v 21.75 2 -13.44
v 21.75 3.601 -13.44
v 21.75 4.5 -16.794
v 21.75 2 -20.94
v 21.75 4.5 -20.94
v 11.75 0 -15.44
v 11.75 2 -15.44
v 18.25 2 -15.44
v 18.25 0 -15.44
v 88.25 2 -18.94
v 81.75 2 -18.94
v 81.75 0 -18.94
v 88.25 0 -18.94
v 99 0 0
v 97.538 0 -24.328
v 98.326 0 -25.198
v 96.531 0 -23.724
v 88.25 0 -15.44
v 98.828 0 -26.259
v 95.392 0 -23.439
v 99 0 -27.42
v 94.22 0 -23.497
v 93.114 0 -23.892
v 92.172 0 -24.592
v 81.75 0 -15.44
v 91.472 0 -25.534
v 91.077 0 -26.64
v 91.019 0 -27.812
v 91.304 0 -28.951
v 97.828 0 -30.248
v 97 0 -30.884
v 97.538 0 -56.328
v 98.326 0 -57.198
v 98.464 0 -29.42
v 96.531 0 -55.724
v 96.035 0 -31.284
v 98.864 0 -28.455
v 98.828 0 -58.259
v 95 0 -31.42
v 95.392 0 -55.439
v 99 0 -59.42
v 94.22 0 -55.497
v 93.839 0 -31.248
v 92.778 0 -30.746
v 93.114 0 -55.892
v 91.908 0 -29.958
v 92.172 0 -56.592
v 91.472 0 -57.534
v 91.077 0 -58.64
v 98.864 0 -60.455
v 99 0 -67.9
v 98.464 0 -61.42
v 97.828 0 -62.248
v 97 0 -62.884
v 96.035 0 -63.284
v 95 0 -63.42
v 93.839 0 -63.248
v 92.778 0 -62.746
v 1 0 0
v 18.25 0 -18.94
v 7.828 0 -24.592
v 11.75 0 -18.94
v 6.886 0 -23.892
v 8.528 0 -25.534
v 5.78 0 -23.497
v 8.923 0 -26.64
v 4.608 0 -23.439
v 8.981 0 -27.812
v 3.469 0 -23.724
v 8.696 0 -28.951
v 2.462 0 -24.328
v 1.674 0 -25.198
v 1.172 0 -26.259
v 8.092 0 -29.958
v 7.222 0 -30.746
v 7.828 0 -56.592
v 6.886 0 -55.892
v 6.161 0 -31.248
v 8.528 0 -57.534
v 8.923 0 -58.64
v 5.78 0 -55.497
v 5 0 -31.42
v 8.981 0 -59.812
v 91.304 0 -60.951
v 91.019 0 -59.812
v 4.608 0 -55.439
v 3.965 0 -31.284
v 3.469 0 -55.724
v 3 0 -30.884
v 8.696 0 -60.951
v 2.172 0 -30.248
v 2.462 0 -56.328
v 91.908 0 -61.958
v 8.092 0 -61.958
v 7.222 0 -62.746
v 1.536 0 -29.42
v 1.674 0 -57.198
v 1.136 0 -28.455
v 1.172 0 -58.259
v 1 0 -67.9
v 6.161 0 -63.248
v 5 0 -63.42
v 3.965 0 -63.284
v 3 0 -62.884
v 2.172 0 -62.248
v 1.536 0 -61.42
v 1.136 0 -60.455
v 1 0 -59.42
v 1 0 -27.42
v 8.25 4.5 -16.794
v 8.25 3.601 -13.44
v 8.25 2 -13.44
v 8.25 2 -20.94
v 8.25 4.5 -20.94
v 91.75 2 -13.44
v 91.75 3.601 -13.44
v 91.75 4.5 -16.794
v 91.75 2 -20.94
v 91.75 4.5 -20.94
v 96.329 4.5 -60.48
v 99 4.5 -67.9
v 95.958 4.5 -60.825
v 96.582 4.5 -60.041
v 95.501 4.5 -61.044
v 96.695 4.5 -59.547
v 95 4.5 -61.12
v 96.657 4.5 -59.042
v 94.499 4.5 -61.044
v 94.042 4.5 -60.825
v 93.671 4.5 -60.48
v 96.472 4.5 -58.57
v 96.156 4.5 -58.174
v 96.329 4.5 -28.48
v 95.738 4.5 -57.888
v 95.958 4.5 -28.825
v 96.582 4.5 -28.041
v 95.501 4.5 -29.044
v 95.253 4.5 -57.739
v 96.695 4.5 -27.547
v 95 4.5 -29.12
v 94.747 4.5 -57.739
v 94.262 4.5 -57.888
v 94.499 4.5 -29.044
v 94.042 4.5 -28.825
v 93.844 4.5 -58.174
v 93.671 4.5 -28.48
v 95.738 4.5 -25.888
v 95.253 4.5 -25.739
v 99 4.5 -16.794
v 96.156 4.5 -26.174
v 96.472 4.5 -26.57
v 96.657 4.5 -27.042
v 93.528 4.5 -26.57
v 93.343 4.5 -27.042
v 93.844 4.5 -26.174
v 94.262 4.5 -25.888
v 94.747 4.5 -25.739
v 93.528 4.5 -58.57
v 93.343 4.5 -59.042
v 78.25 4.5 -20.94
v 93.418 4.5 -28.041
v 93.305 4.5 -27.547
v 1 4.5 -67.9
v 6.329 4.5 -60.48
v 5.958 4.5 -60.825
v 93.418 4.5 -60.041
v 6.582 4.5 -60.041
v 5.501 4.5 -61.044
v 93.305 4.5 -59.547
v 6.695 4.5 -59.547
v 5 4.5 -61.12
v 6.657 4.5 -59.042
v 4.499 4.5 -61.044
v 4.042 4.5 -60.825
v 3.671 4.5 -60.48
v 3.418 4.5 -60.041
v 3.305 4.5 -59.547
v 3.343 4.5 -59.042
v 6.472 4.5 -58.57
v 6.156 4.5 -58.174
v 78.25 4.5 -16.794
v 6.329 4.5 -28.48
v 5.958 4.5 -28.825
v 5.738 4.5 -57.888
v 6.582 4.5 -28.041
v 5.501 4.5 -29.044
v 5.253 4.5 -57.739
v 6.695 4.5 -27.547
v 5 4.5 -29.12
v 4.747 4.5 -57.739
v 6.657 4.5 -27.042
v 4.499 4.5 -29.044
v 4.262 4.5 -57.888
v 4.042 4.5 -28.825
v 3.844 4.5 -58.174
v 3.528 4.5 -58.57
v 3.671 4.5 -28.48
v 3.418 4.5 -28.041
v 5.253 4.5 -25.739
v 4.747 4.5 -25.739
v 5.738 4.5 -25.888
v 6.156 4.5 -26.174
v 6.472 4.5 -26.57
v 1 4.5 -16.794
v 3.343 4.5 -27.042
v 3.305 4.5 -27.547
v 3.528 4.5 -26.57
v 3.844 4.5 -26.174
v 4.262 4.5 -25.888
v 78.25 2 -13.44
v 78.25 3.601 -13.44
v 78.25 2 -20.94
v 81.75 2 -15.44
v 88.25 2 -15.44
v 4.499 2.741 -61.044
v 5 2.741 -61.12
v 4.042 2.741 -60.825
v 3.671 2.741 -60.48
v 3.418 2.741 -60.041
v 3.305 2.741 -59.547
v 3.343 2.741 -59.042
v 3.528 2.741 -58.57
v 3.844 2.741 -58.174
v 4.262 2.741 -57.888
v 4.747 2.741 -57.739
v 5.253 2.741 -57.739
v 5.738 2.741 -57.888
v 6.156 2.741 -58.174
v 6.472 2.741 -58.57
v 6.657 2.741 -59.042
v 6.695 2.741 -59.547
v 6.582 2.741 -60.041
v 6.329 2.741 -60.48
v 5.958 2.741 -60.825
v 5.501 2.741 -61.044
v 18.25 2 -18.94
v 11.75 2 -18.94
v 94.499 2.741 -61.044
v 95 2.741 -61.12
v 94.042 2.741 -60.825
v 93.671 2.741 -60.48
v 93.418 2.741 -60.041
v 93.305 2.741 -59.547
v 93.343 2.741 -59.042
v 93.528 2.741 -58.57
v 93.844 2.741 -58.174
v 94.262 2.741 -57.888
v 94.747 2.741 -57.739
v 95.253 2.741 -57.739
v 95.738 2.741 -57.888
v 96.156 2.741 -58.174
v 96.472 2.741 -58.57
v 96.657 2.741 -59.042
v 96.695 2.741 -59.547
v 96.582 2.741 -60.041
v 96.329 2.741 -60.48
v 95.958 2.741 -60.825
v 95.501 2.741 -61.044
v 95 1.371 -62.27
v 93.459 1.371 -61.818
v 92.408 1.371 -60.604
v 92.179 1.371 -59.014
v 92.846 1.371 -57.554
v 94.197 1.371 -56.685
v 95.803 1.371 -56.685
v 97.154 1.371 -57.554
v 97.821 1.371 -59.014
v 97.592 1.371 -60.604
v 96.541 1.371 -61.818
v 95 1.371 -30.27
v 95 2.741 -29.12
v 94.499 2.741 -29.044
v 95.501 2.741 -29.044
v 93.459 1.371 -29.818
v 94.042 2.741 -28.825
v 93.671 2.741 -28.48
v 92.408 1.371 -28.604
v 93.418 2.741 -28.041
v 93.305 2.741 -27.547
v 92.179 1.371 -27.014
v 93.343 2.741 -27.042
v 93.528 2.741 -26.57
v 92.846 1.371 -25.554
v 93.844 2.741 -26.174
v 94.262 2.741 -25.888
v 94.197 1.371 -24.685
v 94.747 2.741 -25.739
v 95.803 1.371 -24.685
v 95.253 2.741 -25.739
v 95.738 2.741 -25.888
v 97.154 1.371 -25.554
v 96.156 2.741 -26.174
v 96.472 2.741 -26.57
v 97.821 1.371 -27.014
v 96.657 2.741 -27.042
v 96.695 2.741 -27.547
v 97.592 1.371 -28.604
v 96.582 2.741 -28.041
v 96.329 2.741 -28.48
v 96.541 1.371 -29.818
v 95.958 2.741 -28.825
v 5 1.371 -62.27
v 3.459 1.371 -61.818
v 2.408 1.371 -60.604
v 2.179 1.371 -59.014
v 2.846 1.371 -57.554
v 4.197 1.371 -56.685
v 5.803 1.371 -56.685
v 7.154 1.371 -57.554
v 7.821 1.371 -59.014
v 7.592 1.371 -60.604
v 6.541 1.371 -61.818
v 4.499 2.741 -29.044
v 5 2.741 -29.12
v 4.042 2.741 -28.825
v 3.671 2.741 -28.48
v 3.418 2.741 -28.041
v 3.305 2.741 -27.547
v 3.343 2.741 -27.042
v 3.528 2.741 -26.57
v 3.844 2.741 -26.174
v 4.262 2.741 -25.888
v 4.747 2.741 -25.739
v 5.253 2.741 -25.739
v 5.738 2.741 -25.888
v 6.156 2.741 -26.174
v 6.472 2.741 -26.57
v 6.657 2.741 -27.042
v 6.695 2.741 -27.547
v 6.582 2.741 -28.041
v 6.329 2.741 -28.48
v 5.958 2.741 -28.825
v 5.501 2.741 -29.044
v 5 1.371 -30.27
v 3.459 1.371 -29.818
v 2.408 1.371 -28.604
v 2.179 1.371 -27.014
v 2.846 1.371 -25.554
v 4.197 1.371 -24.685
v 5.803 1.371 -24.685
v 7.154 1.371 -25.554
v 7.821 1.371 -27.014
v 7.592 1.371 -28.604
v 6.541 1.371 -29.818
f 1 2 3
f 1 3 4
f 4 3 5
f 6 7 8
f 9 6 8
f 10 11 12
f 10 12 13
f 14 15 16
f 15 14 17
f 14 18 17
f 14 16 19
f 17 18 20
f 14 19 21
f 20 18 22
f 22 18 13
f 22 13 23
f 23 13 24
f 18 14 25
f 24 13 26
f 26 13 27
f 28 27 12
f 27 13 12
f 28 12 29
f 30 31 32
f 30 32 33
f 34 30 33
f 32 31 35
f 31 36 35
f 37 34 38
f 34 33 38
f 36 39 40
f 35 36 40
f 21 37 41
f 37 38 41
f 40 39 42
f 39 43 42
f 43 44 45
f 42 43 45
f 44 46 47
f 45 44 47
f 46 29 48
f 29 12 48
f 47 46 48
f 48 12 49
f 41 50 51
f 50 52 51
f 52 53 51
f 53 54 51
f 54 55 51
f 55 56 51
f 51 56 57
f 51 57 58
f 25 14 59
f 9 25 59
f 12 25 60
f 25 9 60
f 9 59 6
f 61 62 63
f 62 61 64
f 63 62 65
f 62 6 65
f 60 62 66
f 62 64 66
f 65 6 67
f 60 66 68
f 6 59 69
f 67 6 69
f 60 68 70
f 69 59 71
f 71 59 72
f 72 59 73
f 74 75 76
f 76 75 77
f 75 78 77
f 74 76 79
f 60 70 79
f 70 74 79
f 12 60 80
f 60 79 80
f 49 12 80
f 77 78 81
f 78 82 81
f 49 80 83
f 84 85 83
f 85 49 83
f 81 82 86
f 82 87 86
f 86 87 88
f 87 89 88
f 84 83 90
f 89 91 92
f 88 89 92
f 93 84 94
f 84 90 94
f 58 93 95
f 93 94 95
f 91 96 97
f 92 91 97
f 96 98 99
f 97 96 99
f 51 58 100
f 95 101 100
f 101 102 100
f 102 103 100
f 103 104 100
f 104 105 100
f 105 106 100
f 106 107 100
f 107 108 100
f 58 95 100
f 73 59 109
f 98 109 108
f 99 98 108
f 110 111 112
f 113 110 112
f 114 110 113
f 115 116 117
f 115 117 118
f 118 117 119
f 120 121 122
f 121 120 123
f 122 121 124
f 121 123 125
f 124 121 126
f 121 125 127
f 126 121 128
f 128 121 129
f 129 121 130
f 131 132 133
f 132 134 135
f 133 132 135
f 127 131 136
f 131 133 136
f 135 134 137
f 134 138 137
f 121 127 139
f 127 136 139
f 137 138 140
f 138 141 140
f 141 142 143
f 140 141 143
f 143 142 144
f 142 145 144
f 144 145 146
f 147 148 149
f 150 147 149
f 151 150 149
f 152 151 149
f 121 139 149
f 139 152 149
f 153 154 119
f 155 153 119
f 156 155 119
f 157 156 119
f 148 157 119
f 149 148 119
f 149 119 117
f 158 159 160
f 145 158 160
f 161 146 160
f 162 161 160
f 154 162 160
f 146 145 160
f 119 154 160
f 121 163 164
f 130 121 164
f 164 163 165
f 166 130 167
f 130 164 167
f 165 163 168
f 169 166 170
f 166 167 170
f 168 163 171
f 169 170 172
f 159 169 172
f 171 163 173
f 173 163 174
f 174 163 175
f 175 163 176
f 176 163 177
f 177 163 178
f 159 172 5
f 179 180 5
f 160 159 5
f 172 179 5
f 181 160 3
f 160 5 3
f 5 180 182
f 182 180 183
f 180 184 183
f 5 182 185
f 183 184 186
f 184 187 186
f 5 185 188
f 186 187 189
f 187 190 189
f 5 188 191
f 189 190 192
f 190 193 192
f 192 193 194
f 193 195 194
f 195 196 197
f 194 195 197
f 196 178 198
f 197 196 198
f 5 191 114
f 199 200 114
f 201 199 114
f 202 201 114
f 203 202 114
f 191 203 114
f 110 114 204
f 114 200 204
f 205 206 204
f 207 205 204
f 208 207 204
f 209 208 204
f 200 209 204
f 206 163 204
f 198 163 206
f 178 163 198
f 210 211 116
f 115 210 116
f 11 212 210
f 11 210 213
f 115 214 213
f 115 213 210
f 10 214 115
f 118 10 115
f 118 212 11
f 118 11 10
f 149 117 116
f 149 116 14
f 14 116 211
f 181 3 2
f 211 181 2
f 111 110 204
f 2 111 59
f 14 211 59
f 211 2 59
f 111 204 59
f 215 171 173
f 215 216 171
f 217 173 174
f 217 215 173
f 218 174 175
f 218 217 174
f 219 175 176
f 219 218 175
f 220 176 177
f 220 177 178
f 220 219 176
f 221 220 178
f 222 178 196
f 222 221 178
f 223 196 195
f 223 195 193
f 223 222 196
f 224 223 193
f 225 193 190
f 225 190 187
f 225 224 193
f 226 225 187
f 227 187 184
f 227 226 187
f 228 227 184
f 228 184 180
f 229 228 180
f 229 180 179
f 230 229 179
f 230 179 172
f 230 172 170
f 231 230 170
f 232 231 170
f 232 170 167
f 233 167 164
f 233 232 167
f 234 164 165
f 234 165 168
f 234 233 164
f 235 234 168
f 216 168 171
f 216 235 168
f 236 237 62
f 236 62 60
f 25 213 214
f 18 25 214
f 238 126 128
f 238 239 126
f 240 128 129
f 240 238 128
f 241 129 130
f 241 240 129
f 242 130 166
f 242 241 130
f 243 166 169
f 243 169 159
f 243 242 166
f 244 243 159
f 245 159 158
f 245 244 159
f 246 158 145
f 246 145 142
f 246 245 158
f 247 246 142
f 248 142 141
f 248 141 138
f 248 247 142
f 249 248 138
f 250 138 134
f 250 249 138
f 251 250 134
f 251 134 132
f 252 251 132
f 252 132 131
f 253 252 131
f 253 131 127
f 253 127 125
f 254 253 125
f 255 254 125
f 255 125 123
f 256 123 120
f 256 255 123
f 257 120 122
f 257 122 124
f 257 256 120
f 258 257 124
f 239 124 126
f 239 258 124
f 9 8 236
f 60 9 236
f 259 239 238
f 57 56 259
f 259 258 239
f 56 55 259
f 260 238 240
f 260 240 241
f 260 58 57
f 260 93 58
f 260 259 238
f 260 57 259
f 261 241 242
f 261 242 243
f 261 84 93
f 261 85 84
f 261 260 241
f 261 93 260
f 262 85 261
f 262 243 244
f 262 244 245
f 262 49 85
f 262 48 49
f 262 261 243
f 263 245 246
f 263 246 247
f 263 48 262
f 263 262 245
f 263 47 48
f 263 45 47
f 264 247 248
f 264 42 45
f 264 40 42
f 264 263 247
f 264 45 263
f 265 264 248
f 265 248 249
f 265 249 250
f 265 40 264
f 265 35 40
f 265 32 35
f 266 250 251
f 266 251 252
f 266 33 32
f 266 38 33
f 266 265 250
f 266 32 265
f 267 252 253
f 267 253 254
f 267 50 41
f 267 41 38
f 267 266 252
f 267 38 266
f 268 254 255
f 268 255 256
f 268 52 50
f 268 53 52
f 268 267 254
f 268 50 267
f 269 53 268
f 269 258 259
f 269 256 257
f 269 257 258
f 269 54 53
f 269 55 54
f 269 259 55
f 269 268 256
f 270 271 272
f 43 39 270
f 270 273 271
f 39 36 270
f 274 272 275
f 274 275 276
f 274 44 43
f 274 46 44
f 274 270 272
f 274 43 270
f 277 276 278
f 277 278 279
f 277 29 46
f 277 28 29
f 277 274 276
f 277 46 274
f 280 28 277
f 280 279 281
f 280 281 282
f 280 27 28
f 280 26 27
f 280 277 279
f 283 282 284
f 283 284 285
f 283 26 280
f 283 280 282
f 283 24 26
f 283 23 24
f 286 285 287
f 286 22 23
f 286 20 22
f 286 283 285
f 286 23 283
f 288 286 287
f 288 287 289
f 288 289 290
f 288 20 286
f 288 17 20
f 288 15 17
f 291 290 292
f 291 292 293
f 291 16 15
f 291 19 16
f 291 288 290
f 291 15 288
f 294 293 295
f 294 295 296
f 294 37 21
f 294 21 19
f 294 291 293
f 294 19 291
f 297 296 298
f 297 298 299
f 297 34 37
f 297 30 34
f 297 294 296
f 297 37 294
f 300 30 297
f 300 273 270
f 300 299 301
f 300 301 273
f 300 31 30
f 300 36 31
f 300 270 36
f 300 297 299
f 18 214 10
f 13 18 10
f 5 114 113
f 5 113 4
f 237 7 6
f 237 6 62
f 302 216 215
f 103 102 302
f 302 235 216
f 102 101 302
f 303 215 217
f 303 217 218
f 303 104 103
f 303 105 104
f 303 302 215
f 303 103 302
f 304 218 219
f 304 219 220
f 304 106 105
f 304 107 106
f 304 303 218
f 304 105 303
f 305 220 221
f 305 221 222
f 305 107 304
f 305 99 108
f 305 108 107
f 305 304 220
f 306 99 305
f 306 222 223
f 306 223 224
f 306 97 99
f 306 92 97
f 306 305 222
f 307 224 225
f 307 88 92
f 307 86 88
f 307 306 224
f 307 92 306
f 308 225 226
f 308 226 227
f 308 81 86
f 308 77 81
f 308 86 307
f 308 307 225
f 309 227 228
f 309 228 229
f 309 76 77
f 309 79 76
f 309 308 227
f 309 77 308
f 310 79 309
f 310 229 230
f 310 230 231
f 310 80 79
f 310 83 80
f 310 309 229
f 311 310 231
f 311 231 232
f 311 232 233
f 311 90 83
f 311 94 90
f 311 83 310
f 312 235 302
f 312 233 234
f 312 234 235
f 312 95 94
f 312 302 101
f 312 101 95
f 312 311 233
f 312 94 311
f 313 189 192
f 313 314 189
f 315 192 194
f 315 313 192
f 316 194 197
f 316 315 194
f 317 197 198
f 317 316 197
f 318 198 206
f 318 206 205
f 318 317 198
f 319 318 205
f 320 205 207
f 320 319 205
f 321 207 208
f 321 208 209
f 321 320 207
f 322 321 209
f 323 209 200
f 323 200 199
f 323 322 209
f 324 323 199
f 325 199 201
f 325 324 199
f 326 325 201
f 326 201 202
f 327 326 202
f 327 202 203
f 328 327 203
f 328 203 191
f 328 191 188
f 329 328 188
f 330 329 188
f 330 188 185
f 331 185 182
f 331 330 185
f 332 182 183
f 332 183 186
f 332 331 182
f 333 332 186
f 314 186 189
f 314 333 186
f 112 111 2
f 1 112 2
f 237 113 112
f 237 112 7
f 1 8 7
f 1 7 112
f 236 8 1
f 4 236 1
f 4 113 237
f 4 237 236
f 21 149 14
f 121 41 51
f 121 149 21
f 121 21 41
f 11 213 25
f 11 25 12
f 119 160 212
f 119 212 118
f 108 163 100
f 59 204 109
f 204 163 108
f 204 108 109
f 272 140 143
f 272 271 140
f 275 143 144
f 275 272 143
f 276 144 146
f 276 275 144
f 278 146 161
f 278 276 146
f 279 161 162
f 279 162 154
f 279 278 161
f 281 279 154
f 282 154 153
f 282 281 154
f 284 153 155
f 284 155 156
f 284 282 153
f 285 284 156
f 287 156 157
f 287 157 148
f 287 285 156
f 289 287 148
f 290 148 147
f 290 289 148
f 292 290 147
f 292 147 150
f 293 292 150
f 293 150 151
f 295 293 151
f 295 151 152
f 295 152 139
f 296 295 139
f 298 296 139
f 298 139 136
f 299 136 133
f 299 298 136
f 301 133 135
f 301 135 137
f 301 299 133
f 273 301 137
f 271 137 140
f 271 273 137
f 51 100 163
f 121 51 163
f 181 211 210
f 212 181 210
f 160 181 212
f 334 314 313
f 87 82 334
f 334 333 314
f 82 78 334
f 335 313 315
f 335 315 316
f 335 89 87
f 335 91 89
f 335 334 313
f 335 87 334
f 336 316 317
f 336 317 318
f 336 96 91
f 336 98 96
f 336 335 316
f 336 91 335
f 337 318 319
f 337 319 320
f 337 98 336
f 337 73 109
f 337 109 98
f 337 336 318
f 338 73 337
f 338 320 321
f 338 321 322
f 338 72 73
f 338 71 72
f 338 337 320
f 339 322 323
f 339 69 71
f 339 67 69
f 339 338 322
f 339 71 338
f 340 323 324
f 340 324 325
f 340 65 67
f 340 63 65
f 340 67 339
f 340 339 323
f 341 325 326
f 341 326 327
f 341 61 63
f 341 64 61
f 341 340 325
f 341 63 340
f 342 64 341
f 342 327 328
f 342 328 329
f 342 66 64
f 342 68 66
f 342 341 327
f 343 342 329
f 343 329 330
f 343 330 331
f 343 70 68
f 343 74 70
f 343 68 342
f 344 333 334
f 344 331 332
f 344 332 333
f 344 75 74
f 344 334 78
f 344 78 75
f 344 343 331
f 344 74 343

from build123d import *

# Parameters (mm, degrees)
SALIENTE_EXTRUIR1_DEPTH                        = 100
CSK_FOR_M3_FLAT_HEAD_MACHINE_SCREW1_AT_2_COUNT = 2
CSK_FOR_M3_FLAT_HEAD_MACHINE_SCREW1_AT_2_PITCH = 90
CSK_FOR_M3_FLAT_HEAD_MACHINE_SCREW1_AT_3_COUNT = 2
CSK_FOR_M3_FLAT_HEAD_MACHINE_SCREW1_AT_3_PITCH = 95.51963149
CSK_FOR_M3_FLAT_HEAD_MACHINE_SCREW1_AT_4_COUNT = 2
CSK_FOR_M3_FLAT_HEAD_MACHINE_SCREW1_AT_4_PITCH = 32
CROQUIS4_W                                     = 6.5
CROQUIS4_H                                     = 3.5
CORTAR_EXTRUIR3_DEPTH                          = 121.957265181
CROQUIS8_W                                     = 13.5
CROQUIS8_H                                     = 7.5
CORTAR_EXTRUIR4_DEPTH                          = 2.5
CORTAR_EXTRUIR5_DEPTH                          = 1
CROQUIS12_W                                    = 67.9
CROQUIS12_H                                    = 8.529184672
CORTAR_EXTRUIR6_DEPTH                          = 1


with BuildPart() as part:
    # Croquis1 → Saliente-Extruir1 (new body)
    with BuildSketch(Plane(origin=(0, 0, 0), x_dir=(0, 0, -1), z_dir=(1, 0, 0))):
        Polygon((0, 0), (67.9, 0), (67.9, 4.5), (16.794228634, 4.5), align=None)
    extrude(amount=SALIENTE_EXTRUIR1_DEPTH)

    # Croquis3 → CSK for M3 Flat Head Machine Screw1 (revolve, cut)
    with BuildSketch(Plane(origin=(95, 0, -59.42), x_dir=(0, 0, -1), z_dir=(1, 0, 0))):
        Polygon((0, 0), (0, 4.5), (1.7, 4.5), (1.7, 2.741033263), (4, 0), align=None)
    csk_for_m3_flat_head_machine_screw1 = revolve(axis=Axis((95, -6.35, -59.42), (0, 1, 0)), mode=Mode.SUBTRACT)

    # CSK for M3 Flat Head Machine Screw1 at 2: CSK for M3 Flat Head Machine Screw1 ×2
    with Locations(*[(-i * CSK_FOR_M3_FLAT_HEAD_MACHINE_SCREW1_AT_2_PITCH, 0, 0) for i in range(1, CSK_FOR_M3_FLAT_HEAD_MACHINE_SCREW1_AT_2_COUNT)]):
        add(csk_for_m3_flat_head_machine_screw1, mode=Mode.SUBTRACT)

    # CSK for M3 Flat Head Machine Screw1 at 3: CSK for M3 Flat Head Machine Screw1 ×2
    with Locations(*[Vector(-0.9422146902791427, 0, 0.33500966765479934) * (i * CSK_FOR_M3_FLAT_HEAD_MACHINE_SCREW1_AT_3_PITCH) for i in range(1, CSK_FOR_M3_FLAT_HEAD_MACHINE_SCREW1_AT_3_COUNT)]):
        add(csk_for_m3_flat_head_machine_screw1, mode=Mode.SUBTRACT)

    # CSK for M3 Flat Head Machine Screw1 at 4: CSK for M3 Flat Head Machine Screw1 ×2
    with Locations(*[(0, 0, i * CSK_FOR_M3_FLAT_HEAD_MACHINE_SCREW1_AT_4_PITCH) for i in range(1, CSK_FOR_M3_FLAT_HEAD_MACHINE_SCREW1_AT_4_COUNT)]):
        add(csk_for_m3_flat_head_machine_screw1, mode=Mode.SUBTRACT)

    # Croquis4 → Cortar-Extruir3 (cut, through all)
    with BuildSketch(Plane(origin=(0, 4.5, 0), x_dir=(1, 0, 0), z_dir=(0, 1, 0))):
        with Locations((15, 17.19)):
            Rectangle(CROQUIS4_W, CROQUIS4_H)
        with Locations((85, 17.19)):
            Rectangle(CROQUIS4_W, CROQUIS4_H)
    extrude(amount=-CORTAR_EXTRUIR3_DEPTH, mode=Mode.SUBTRACT)

    # Croquis8 → Cortar-Extruir4 (cut)
    with BuildSketch(Plane(origin=(0, 4.5, 0), x_dir=(1, 0, 0), z_dir=(0, 1, 0))):
        with Locations((15, 17.19)):
            Rectangle(CROQUIS8_W, CROQUIS8_H)
        with Locations((85, 17.19)):
            Rectangle(CROQUIS8_W, CROQUIS8_H)
    extrude(amount=-CORTAR_EXTRUIR4_DEPTH, mode=Mode.SUBTRACT)

    # Croquis11 → Cortar-Extruir5 (cut)
    with BuildSketch(Plane(origin=(100, 0, 0), x_dir=(0, 0, -1), z_dir=(1, 0, 0))):
        Polygon((0, 0), (67.9, 0), (67.9, 7.340226628), (-0.455473411, 7.340226628), align=None)
    extrude(amount=-CORTAR_EXTRUIR5_DEPTH, mode=Mode.SUBTRACT)

    # Croquis12 → Cortar-Extruir6 (cut)
    with BuildSketch(Plane.ZY):
        with Locations((-33.95, 4.264592336)):
            Rectangle(CROQUIS12_W, CROQUIS12_H)
    extrude(amount=-CORTAR_EXTRUIR6_DEPTH, mode=Mode.SUBTRACT)


solid = part.part
